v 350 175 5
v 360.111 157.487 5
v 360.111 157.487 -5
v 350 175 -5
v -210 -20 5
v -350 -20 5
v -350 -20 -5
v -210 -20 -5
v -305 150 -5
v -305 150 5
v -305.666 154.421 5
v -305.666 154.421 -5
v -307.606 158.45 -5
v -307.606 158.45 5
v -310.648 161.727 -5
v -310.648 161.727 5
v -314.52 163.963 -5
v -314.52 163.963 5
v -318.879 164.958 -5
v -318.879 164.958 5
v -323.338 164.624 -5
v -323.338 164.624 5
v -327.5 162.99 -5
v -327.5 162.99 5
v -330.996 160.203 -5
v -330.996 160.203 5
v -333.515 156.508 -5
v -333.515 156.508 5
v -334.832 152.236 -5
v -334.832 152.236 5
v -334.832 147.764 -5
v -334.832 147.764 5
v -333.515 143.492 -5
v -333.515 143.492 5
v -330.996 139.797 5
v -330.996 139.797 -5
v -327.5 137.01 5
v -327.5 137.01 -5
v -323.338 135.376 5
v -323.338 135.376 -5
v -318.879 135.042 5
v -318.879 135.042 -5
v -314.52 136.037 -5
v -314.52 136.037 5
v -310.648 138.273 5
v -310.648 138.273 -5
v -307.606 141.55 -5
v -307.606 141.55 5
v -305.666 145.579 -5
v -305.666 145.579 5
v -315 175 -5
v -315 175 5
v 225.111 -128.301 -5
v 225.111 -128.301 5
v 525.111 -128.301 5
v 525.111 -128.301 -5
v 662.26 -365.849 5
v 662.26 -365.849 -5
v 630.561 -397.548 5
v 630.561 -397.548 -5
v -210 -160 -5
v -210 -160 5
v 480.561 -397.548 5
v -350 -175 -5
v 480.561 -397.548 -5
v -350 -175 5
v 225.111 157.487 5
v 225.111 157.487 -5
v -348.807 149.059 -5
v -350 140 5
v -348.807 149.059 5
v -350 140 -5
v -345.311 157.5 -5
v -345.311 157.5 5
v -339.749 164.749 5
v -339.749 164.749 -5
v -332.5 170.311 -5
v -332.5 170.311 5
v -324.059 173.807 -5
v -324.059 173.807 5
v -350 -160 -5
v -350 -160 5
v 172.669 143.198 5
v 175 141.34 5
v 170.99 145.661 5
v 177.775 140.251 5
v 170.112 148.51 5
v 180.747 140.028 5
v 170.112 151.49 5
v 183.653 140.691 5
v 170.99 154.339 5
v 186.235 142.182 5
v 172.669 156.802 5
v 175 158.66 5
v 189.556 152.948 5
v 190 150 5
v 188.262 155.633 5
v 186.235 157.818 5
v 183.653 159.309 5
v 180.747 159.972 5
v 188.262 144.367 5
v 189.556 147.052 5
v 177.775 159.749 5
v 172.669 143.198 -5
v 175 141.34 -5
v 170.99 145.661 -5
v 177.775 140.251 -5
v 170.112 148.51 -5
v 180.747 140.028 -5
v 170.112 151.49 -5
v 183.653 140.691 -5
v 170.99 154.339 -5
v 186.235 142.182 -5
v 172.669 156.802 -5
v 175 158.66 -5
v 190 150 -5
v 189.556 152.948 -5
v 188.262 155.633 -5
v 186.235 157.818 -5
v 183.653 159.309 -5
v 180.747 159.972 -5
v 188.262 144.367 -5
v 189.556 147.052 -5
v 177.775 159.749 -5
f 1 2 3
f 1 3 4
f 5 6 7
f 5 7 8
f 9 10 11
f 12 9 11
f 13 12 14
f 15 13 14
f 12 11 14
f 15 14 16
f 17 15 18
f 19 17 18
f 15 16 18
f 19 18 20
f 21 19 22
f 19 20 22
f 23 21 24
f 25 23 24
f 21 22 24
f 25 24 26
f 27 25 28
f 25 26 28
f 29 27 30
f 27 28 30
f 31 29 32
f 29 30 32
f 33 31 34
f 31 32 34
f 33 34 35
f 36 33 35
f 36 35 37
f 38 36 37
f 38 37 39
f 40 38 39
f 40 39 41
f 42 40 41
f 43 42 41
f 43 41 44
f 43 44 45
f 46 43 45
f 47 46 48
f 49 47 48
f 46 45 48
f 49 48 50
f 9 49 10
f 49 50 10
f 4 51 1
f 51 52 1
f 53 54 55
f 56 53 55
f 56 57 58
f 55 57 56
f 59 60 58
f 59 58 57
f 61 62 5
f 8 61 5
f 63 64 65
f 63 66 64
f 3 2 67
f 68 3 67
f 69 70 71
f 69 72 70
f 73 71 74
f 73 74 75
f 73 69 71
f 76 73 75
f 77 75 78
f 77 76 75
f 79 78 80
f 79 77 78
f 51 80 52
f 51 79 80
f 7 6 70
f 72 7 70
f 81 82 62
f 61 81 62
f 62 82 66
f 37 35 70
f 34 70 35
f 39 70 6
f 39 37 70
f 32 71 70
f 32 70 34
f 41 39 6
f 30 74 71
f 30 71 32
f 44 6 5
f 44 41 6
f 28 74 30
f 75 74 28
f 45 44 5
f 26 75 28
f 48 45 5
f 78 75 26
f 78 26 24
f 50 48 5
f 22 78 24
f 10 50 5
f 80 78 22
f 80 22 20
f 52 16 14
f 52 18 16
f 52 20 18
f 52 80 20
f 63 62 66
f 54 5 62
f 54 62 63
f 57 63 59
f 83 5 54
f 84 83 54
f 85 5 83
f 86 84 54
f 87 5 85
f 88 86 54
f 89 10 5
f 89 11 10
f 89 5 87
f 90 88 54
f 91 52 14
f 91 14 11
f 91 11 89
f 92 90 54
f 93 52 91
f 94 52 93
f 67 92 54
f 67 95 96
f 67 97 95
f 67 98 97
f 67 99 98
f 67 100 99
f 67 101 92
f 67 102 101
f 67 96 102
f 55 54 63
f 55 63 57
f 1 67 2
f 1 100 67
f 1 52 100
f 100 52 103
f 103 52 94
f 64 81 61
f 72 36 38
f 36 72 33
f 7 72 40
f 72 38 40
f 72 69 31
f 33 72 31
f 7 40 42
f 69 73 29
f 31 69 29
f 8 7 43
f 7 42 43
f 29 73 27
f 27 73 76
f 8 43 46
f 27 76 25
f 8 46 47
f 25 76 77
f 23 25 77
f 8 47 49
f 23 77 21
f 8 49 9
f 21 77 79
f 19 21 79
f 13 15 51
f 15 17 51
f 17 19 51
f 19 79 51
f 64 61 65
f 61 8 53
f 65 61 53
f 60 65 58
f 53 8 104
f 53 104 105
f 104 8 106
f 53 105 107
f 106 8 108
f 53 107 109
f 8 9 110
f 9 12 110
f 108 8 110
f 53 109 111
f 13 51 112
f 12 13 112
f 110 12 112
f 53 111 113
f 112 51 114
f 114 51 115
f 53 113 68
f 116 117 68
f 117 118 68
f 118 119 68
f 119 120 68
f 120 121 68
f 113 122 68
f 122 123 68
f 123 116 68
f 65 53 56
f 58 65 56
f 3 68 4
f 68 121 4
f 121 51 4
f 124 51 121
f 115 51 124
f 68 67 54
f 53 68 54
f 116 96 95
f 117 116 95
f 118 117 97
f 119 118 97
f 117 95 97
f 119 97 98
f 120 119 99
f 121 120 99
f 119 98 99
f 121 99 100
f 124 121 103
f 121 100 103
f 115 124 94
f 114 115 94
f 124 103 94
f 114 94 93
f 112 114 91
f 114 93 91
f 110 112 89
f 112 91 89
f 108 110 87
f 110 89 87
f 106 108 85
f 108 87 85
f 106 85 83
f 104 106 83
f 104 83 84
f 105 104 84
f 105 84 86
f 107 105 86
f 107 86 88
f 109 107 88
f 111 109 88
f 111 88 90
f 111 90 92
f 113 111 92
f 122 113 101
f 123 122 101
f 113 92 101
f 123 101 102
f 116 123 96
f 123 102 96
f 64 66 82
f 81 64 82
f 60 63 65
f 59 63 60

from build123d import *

# Parameters (mm, degrees)
SKETCH1_W           = 700
SKETCH1_H           = 350
BOSS_EXTRUDE2_DEPTH = 5
SKETCH2_R           = 15
SKETCH2_R_2         = 10
CUT_EXTRUDE1_DEPTH  = 10
FILLET1_R           = 35
SKETCH3_W           = 140
SKETCH3_H           = 140
CUT_EXTRUDE2_DEPTH  = 789.23060426
CHAMFER1_SIZE       = 50
CHAMFER1_SIZE2      = 36.602540378


with BuildPart() as part:
    # Sketch1 → Boss-Extrude2 (new, symmetric)
    with BuildSketch(Plane.XY):
        Polygon((350, -175), (-350, -175), (480.560796608, -397.548094716), (680.560796608, -397.548094716), (350, 175), align=None)
        Rectangle(SKETCH1_W, SKETCH1_H)
    extrude(amount=BOSS_EXTRUDE2_DEPTH, both=True)

    # Sketch2 → Cut-Extrude1 (cut)
    with BuildSketch(Plane.XY.offset(5)):
        with Locations((-320, 150)):
            Circle(SKETCH2_R)
        with Locations((180, 150)):
            Circle(SKETCH2_R_2)
    extrude(amount=-CUT_EXTRUDE1_DEPTH, mode=Mode.SUBTRACT)

    # Fillet1
    fillet1_edges = [part.edges().sort_by_distance(p)[0] for p in [
        (-350, 175, 0),
    ]]
    fillet(fillet1_edges, radius=FILLET1_R)

    # Sketch3 → Cut-Extrude2 (cut, through all)
    with BuildSketch(Plane.XY.offset(5)):
        with Locations((-280, -90)):
            Rectangle(SKETCH3_W, SKETCH3_H)
        Polygon((225.111069989, 157.48711306), (225.111069989, -128.301270189), (525.111069989, -128.301270189), (360.111069989, 157.48711306), align=None)
    extrude(amount=-CUT_EXTRUDE2_DEPTH, mode=Mode.SUBTRACT)

    # Chamfer1
    chamfer1_edges = [part.edges().sort_by_distance(p)[0] for p in [
        (680.560796608, -397.548094716, 0),
    ]]
    chamfer1_side = [part.faces().sort_by_distance(p)[0] for p in [
        (580.560796608, -397.548094716, 0),
    ]]
    chamfer(chamfer1_edges, length=CHAMFER1_SIZE, length2=CHAMFER1_SIZE2, reference=chamfer1_side[0])


solid = part.part
